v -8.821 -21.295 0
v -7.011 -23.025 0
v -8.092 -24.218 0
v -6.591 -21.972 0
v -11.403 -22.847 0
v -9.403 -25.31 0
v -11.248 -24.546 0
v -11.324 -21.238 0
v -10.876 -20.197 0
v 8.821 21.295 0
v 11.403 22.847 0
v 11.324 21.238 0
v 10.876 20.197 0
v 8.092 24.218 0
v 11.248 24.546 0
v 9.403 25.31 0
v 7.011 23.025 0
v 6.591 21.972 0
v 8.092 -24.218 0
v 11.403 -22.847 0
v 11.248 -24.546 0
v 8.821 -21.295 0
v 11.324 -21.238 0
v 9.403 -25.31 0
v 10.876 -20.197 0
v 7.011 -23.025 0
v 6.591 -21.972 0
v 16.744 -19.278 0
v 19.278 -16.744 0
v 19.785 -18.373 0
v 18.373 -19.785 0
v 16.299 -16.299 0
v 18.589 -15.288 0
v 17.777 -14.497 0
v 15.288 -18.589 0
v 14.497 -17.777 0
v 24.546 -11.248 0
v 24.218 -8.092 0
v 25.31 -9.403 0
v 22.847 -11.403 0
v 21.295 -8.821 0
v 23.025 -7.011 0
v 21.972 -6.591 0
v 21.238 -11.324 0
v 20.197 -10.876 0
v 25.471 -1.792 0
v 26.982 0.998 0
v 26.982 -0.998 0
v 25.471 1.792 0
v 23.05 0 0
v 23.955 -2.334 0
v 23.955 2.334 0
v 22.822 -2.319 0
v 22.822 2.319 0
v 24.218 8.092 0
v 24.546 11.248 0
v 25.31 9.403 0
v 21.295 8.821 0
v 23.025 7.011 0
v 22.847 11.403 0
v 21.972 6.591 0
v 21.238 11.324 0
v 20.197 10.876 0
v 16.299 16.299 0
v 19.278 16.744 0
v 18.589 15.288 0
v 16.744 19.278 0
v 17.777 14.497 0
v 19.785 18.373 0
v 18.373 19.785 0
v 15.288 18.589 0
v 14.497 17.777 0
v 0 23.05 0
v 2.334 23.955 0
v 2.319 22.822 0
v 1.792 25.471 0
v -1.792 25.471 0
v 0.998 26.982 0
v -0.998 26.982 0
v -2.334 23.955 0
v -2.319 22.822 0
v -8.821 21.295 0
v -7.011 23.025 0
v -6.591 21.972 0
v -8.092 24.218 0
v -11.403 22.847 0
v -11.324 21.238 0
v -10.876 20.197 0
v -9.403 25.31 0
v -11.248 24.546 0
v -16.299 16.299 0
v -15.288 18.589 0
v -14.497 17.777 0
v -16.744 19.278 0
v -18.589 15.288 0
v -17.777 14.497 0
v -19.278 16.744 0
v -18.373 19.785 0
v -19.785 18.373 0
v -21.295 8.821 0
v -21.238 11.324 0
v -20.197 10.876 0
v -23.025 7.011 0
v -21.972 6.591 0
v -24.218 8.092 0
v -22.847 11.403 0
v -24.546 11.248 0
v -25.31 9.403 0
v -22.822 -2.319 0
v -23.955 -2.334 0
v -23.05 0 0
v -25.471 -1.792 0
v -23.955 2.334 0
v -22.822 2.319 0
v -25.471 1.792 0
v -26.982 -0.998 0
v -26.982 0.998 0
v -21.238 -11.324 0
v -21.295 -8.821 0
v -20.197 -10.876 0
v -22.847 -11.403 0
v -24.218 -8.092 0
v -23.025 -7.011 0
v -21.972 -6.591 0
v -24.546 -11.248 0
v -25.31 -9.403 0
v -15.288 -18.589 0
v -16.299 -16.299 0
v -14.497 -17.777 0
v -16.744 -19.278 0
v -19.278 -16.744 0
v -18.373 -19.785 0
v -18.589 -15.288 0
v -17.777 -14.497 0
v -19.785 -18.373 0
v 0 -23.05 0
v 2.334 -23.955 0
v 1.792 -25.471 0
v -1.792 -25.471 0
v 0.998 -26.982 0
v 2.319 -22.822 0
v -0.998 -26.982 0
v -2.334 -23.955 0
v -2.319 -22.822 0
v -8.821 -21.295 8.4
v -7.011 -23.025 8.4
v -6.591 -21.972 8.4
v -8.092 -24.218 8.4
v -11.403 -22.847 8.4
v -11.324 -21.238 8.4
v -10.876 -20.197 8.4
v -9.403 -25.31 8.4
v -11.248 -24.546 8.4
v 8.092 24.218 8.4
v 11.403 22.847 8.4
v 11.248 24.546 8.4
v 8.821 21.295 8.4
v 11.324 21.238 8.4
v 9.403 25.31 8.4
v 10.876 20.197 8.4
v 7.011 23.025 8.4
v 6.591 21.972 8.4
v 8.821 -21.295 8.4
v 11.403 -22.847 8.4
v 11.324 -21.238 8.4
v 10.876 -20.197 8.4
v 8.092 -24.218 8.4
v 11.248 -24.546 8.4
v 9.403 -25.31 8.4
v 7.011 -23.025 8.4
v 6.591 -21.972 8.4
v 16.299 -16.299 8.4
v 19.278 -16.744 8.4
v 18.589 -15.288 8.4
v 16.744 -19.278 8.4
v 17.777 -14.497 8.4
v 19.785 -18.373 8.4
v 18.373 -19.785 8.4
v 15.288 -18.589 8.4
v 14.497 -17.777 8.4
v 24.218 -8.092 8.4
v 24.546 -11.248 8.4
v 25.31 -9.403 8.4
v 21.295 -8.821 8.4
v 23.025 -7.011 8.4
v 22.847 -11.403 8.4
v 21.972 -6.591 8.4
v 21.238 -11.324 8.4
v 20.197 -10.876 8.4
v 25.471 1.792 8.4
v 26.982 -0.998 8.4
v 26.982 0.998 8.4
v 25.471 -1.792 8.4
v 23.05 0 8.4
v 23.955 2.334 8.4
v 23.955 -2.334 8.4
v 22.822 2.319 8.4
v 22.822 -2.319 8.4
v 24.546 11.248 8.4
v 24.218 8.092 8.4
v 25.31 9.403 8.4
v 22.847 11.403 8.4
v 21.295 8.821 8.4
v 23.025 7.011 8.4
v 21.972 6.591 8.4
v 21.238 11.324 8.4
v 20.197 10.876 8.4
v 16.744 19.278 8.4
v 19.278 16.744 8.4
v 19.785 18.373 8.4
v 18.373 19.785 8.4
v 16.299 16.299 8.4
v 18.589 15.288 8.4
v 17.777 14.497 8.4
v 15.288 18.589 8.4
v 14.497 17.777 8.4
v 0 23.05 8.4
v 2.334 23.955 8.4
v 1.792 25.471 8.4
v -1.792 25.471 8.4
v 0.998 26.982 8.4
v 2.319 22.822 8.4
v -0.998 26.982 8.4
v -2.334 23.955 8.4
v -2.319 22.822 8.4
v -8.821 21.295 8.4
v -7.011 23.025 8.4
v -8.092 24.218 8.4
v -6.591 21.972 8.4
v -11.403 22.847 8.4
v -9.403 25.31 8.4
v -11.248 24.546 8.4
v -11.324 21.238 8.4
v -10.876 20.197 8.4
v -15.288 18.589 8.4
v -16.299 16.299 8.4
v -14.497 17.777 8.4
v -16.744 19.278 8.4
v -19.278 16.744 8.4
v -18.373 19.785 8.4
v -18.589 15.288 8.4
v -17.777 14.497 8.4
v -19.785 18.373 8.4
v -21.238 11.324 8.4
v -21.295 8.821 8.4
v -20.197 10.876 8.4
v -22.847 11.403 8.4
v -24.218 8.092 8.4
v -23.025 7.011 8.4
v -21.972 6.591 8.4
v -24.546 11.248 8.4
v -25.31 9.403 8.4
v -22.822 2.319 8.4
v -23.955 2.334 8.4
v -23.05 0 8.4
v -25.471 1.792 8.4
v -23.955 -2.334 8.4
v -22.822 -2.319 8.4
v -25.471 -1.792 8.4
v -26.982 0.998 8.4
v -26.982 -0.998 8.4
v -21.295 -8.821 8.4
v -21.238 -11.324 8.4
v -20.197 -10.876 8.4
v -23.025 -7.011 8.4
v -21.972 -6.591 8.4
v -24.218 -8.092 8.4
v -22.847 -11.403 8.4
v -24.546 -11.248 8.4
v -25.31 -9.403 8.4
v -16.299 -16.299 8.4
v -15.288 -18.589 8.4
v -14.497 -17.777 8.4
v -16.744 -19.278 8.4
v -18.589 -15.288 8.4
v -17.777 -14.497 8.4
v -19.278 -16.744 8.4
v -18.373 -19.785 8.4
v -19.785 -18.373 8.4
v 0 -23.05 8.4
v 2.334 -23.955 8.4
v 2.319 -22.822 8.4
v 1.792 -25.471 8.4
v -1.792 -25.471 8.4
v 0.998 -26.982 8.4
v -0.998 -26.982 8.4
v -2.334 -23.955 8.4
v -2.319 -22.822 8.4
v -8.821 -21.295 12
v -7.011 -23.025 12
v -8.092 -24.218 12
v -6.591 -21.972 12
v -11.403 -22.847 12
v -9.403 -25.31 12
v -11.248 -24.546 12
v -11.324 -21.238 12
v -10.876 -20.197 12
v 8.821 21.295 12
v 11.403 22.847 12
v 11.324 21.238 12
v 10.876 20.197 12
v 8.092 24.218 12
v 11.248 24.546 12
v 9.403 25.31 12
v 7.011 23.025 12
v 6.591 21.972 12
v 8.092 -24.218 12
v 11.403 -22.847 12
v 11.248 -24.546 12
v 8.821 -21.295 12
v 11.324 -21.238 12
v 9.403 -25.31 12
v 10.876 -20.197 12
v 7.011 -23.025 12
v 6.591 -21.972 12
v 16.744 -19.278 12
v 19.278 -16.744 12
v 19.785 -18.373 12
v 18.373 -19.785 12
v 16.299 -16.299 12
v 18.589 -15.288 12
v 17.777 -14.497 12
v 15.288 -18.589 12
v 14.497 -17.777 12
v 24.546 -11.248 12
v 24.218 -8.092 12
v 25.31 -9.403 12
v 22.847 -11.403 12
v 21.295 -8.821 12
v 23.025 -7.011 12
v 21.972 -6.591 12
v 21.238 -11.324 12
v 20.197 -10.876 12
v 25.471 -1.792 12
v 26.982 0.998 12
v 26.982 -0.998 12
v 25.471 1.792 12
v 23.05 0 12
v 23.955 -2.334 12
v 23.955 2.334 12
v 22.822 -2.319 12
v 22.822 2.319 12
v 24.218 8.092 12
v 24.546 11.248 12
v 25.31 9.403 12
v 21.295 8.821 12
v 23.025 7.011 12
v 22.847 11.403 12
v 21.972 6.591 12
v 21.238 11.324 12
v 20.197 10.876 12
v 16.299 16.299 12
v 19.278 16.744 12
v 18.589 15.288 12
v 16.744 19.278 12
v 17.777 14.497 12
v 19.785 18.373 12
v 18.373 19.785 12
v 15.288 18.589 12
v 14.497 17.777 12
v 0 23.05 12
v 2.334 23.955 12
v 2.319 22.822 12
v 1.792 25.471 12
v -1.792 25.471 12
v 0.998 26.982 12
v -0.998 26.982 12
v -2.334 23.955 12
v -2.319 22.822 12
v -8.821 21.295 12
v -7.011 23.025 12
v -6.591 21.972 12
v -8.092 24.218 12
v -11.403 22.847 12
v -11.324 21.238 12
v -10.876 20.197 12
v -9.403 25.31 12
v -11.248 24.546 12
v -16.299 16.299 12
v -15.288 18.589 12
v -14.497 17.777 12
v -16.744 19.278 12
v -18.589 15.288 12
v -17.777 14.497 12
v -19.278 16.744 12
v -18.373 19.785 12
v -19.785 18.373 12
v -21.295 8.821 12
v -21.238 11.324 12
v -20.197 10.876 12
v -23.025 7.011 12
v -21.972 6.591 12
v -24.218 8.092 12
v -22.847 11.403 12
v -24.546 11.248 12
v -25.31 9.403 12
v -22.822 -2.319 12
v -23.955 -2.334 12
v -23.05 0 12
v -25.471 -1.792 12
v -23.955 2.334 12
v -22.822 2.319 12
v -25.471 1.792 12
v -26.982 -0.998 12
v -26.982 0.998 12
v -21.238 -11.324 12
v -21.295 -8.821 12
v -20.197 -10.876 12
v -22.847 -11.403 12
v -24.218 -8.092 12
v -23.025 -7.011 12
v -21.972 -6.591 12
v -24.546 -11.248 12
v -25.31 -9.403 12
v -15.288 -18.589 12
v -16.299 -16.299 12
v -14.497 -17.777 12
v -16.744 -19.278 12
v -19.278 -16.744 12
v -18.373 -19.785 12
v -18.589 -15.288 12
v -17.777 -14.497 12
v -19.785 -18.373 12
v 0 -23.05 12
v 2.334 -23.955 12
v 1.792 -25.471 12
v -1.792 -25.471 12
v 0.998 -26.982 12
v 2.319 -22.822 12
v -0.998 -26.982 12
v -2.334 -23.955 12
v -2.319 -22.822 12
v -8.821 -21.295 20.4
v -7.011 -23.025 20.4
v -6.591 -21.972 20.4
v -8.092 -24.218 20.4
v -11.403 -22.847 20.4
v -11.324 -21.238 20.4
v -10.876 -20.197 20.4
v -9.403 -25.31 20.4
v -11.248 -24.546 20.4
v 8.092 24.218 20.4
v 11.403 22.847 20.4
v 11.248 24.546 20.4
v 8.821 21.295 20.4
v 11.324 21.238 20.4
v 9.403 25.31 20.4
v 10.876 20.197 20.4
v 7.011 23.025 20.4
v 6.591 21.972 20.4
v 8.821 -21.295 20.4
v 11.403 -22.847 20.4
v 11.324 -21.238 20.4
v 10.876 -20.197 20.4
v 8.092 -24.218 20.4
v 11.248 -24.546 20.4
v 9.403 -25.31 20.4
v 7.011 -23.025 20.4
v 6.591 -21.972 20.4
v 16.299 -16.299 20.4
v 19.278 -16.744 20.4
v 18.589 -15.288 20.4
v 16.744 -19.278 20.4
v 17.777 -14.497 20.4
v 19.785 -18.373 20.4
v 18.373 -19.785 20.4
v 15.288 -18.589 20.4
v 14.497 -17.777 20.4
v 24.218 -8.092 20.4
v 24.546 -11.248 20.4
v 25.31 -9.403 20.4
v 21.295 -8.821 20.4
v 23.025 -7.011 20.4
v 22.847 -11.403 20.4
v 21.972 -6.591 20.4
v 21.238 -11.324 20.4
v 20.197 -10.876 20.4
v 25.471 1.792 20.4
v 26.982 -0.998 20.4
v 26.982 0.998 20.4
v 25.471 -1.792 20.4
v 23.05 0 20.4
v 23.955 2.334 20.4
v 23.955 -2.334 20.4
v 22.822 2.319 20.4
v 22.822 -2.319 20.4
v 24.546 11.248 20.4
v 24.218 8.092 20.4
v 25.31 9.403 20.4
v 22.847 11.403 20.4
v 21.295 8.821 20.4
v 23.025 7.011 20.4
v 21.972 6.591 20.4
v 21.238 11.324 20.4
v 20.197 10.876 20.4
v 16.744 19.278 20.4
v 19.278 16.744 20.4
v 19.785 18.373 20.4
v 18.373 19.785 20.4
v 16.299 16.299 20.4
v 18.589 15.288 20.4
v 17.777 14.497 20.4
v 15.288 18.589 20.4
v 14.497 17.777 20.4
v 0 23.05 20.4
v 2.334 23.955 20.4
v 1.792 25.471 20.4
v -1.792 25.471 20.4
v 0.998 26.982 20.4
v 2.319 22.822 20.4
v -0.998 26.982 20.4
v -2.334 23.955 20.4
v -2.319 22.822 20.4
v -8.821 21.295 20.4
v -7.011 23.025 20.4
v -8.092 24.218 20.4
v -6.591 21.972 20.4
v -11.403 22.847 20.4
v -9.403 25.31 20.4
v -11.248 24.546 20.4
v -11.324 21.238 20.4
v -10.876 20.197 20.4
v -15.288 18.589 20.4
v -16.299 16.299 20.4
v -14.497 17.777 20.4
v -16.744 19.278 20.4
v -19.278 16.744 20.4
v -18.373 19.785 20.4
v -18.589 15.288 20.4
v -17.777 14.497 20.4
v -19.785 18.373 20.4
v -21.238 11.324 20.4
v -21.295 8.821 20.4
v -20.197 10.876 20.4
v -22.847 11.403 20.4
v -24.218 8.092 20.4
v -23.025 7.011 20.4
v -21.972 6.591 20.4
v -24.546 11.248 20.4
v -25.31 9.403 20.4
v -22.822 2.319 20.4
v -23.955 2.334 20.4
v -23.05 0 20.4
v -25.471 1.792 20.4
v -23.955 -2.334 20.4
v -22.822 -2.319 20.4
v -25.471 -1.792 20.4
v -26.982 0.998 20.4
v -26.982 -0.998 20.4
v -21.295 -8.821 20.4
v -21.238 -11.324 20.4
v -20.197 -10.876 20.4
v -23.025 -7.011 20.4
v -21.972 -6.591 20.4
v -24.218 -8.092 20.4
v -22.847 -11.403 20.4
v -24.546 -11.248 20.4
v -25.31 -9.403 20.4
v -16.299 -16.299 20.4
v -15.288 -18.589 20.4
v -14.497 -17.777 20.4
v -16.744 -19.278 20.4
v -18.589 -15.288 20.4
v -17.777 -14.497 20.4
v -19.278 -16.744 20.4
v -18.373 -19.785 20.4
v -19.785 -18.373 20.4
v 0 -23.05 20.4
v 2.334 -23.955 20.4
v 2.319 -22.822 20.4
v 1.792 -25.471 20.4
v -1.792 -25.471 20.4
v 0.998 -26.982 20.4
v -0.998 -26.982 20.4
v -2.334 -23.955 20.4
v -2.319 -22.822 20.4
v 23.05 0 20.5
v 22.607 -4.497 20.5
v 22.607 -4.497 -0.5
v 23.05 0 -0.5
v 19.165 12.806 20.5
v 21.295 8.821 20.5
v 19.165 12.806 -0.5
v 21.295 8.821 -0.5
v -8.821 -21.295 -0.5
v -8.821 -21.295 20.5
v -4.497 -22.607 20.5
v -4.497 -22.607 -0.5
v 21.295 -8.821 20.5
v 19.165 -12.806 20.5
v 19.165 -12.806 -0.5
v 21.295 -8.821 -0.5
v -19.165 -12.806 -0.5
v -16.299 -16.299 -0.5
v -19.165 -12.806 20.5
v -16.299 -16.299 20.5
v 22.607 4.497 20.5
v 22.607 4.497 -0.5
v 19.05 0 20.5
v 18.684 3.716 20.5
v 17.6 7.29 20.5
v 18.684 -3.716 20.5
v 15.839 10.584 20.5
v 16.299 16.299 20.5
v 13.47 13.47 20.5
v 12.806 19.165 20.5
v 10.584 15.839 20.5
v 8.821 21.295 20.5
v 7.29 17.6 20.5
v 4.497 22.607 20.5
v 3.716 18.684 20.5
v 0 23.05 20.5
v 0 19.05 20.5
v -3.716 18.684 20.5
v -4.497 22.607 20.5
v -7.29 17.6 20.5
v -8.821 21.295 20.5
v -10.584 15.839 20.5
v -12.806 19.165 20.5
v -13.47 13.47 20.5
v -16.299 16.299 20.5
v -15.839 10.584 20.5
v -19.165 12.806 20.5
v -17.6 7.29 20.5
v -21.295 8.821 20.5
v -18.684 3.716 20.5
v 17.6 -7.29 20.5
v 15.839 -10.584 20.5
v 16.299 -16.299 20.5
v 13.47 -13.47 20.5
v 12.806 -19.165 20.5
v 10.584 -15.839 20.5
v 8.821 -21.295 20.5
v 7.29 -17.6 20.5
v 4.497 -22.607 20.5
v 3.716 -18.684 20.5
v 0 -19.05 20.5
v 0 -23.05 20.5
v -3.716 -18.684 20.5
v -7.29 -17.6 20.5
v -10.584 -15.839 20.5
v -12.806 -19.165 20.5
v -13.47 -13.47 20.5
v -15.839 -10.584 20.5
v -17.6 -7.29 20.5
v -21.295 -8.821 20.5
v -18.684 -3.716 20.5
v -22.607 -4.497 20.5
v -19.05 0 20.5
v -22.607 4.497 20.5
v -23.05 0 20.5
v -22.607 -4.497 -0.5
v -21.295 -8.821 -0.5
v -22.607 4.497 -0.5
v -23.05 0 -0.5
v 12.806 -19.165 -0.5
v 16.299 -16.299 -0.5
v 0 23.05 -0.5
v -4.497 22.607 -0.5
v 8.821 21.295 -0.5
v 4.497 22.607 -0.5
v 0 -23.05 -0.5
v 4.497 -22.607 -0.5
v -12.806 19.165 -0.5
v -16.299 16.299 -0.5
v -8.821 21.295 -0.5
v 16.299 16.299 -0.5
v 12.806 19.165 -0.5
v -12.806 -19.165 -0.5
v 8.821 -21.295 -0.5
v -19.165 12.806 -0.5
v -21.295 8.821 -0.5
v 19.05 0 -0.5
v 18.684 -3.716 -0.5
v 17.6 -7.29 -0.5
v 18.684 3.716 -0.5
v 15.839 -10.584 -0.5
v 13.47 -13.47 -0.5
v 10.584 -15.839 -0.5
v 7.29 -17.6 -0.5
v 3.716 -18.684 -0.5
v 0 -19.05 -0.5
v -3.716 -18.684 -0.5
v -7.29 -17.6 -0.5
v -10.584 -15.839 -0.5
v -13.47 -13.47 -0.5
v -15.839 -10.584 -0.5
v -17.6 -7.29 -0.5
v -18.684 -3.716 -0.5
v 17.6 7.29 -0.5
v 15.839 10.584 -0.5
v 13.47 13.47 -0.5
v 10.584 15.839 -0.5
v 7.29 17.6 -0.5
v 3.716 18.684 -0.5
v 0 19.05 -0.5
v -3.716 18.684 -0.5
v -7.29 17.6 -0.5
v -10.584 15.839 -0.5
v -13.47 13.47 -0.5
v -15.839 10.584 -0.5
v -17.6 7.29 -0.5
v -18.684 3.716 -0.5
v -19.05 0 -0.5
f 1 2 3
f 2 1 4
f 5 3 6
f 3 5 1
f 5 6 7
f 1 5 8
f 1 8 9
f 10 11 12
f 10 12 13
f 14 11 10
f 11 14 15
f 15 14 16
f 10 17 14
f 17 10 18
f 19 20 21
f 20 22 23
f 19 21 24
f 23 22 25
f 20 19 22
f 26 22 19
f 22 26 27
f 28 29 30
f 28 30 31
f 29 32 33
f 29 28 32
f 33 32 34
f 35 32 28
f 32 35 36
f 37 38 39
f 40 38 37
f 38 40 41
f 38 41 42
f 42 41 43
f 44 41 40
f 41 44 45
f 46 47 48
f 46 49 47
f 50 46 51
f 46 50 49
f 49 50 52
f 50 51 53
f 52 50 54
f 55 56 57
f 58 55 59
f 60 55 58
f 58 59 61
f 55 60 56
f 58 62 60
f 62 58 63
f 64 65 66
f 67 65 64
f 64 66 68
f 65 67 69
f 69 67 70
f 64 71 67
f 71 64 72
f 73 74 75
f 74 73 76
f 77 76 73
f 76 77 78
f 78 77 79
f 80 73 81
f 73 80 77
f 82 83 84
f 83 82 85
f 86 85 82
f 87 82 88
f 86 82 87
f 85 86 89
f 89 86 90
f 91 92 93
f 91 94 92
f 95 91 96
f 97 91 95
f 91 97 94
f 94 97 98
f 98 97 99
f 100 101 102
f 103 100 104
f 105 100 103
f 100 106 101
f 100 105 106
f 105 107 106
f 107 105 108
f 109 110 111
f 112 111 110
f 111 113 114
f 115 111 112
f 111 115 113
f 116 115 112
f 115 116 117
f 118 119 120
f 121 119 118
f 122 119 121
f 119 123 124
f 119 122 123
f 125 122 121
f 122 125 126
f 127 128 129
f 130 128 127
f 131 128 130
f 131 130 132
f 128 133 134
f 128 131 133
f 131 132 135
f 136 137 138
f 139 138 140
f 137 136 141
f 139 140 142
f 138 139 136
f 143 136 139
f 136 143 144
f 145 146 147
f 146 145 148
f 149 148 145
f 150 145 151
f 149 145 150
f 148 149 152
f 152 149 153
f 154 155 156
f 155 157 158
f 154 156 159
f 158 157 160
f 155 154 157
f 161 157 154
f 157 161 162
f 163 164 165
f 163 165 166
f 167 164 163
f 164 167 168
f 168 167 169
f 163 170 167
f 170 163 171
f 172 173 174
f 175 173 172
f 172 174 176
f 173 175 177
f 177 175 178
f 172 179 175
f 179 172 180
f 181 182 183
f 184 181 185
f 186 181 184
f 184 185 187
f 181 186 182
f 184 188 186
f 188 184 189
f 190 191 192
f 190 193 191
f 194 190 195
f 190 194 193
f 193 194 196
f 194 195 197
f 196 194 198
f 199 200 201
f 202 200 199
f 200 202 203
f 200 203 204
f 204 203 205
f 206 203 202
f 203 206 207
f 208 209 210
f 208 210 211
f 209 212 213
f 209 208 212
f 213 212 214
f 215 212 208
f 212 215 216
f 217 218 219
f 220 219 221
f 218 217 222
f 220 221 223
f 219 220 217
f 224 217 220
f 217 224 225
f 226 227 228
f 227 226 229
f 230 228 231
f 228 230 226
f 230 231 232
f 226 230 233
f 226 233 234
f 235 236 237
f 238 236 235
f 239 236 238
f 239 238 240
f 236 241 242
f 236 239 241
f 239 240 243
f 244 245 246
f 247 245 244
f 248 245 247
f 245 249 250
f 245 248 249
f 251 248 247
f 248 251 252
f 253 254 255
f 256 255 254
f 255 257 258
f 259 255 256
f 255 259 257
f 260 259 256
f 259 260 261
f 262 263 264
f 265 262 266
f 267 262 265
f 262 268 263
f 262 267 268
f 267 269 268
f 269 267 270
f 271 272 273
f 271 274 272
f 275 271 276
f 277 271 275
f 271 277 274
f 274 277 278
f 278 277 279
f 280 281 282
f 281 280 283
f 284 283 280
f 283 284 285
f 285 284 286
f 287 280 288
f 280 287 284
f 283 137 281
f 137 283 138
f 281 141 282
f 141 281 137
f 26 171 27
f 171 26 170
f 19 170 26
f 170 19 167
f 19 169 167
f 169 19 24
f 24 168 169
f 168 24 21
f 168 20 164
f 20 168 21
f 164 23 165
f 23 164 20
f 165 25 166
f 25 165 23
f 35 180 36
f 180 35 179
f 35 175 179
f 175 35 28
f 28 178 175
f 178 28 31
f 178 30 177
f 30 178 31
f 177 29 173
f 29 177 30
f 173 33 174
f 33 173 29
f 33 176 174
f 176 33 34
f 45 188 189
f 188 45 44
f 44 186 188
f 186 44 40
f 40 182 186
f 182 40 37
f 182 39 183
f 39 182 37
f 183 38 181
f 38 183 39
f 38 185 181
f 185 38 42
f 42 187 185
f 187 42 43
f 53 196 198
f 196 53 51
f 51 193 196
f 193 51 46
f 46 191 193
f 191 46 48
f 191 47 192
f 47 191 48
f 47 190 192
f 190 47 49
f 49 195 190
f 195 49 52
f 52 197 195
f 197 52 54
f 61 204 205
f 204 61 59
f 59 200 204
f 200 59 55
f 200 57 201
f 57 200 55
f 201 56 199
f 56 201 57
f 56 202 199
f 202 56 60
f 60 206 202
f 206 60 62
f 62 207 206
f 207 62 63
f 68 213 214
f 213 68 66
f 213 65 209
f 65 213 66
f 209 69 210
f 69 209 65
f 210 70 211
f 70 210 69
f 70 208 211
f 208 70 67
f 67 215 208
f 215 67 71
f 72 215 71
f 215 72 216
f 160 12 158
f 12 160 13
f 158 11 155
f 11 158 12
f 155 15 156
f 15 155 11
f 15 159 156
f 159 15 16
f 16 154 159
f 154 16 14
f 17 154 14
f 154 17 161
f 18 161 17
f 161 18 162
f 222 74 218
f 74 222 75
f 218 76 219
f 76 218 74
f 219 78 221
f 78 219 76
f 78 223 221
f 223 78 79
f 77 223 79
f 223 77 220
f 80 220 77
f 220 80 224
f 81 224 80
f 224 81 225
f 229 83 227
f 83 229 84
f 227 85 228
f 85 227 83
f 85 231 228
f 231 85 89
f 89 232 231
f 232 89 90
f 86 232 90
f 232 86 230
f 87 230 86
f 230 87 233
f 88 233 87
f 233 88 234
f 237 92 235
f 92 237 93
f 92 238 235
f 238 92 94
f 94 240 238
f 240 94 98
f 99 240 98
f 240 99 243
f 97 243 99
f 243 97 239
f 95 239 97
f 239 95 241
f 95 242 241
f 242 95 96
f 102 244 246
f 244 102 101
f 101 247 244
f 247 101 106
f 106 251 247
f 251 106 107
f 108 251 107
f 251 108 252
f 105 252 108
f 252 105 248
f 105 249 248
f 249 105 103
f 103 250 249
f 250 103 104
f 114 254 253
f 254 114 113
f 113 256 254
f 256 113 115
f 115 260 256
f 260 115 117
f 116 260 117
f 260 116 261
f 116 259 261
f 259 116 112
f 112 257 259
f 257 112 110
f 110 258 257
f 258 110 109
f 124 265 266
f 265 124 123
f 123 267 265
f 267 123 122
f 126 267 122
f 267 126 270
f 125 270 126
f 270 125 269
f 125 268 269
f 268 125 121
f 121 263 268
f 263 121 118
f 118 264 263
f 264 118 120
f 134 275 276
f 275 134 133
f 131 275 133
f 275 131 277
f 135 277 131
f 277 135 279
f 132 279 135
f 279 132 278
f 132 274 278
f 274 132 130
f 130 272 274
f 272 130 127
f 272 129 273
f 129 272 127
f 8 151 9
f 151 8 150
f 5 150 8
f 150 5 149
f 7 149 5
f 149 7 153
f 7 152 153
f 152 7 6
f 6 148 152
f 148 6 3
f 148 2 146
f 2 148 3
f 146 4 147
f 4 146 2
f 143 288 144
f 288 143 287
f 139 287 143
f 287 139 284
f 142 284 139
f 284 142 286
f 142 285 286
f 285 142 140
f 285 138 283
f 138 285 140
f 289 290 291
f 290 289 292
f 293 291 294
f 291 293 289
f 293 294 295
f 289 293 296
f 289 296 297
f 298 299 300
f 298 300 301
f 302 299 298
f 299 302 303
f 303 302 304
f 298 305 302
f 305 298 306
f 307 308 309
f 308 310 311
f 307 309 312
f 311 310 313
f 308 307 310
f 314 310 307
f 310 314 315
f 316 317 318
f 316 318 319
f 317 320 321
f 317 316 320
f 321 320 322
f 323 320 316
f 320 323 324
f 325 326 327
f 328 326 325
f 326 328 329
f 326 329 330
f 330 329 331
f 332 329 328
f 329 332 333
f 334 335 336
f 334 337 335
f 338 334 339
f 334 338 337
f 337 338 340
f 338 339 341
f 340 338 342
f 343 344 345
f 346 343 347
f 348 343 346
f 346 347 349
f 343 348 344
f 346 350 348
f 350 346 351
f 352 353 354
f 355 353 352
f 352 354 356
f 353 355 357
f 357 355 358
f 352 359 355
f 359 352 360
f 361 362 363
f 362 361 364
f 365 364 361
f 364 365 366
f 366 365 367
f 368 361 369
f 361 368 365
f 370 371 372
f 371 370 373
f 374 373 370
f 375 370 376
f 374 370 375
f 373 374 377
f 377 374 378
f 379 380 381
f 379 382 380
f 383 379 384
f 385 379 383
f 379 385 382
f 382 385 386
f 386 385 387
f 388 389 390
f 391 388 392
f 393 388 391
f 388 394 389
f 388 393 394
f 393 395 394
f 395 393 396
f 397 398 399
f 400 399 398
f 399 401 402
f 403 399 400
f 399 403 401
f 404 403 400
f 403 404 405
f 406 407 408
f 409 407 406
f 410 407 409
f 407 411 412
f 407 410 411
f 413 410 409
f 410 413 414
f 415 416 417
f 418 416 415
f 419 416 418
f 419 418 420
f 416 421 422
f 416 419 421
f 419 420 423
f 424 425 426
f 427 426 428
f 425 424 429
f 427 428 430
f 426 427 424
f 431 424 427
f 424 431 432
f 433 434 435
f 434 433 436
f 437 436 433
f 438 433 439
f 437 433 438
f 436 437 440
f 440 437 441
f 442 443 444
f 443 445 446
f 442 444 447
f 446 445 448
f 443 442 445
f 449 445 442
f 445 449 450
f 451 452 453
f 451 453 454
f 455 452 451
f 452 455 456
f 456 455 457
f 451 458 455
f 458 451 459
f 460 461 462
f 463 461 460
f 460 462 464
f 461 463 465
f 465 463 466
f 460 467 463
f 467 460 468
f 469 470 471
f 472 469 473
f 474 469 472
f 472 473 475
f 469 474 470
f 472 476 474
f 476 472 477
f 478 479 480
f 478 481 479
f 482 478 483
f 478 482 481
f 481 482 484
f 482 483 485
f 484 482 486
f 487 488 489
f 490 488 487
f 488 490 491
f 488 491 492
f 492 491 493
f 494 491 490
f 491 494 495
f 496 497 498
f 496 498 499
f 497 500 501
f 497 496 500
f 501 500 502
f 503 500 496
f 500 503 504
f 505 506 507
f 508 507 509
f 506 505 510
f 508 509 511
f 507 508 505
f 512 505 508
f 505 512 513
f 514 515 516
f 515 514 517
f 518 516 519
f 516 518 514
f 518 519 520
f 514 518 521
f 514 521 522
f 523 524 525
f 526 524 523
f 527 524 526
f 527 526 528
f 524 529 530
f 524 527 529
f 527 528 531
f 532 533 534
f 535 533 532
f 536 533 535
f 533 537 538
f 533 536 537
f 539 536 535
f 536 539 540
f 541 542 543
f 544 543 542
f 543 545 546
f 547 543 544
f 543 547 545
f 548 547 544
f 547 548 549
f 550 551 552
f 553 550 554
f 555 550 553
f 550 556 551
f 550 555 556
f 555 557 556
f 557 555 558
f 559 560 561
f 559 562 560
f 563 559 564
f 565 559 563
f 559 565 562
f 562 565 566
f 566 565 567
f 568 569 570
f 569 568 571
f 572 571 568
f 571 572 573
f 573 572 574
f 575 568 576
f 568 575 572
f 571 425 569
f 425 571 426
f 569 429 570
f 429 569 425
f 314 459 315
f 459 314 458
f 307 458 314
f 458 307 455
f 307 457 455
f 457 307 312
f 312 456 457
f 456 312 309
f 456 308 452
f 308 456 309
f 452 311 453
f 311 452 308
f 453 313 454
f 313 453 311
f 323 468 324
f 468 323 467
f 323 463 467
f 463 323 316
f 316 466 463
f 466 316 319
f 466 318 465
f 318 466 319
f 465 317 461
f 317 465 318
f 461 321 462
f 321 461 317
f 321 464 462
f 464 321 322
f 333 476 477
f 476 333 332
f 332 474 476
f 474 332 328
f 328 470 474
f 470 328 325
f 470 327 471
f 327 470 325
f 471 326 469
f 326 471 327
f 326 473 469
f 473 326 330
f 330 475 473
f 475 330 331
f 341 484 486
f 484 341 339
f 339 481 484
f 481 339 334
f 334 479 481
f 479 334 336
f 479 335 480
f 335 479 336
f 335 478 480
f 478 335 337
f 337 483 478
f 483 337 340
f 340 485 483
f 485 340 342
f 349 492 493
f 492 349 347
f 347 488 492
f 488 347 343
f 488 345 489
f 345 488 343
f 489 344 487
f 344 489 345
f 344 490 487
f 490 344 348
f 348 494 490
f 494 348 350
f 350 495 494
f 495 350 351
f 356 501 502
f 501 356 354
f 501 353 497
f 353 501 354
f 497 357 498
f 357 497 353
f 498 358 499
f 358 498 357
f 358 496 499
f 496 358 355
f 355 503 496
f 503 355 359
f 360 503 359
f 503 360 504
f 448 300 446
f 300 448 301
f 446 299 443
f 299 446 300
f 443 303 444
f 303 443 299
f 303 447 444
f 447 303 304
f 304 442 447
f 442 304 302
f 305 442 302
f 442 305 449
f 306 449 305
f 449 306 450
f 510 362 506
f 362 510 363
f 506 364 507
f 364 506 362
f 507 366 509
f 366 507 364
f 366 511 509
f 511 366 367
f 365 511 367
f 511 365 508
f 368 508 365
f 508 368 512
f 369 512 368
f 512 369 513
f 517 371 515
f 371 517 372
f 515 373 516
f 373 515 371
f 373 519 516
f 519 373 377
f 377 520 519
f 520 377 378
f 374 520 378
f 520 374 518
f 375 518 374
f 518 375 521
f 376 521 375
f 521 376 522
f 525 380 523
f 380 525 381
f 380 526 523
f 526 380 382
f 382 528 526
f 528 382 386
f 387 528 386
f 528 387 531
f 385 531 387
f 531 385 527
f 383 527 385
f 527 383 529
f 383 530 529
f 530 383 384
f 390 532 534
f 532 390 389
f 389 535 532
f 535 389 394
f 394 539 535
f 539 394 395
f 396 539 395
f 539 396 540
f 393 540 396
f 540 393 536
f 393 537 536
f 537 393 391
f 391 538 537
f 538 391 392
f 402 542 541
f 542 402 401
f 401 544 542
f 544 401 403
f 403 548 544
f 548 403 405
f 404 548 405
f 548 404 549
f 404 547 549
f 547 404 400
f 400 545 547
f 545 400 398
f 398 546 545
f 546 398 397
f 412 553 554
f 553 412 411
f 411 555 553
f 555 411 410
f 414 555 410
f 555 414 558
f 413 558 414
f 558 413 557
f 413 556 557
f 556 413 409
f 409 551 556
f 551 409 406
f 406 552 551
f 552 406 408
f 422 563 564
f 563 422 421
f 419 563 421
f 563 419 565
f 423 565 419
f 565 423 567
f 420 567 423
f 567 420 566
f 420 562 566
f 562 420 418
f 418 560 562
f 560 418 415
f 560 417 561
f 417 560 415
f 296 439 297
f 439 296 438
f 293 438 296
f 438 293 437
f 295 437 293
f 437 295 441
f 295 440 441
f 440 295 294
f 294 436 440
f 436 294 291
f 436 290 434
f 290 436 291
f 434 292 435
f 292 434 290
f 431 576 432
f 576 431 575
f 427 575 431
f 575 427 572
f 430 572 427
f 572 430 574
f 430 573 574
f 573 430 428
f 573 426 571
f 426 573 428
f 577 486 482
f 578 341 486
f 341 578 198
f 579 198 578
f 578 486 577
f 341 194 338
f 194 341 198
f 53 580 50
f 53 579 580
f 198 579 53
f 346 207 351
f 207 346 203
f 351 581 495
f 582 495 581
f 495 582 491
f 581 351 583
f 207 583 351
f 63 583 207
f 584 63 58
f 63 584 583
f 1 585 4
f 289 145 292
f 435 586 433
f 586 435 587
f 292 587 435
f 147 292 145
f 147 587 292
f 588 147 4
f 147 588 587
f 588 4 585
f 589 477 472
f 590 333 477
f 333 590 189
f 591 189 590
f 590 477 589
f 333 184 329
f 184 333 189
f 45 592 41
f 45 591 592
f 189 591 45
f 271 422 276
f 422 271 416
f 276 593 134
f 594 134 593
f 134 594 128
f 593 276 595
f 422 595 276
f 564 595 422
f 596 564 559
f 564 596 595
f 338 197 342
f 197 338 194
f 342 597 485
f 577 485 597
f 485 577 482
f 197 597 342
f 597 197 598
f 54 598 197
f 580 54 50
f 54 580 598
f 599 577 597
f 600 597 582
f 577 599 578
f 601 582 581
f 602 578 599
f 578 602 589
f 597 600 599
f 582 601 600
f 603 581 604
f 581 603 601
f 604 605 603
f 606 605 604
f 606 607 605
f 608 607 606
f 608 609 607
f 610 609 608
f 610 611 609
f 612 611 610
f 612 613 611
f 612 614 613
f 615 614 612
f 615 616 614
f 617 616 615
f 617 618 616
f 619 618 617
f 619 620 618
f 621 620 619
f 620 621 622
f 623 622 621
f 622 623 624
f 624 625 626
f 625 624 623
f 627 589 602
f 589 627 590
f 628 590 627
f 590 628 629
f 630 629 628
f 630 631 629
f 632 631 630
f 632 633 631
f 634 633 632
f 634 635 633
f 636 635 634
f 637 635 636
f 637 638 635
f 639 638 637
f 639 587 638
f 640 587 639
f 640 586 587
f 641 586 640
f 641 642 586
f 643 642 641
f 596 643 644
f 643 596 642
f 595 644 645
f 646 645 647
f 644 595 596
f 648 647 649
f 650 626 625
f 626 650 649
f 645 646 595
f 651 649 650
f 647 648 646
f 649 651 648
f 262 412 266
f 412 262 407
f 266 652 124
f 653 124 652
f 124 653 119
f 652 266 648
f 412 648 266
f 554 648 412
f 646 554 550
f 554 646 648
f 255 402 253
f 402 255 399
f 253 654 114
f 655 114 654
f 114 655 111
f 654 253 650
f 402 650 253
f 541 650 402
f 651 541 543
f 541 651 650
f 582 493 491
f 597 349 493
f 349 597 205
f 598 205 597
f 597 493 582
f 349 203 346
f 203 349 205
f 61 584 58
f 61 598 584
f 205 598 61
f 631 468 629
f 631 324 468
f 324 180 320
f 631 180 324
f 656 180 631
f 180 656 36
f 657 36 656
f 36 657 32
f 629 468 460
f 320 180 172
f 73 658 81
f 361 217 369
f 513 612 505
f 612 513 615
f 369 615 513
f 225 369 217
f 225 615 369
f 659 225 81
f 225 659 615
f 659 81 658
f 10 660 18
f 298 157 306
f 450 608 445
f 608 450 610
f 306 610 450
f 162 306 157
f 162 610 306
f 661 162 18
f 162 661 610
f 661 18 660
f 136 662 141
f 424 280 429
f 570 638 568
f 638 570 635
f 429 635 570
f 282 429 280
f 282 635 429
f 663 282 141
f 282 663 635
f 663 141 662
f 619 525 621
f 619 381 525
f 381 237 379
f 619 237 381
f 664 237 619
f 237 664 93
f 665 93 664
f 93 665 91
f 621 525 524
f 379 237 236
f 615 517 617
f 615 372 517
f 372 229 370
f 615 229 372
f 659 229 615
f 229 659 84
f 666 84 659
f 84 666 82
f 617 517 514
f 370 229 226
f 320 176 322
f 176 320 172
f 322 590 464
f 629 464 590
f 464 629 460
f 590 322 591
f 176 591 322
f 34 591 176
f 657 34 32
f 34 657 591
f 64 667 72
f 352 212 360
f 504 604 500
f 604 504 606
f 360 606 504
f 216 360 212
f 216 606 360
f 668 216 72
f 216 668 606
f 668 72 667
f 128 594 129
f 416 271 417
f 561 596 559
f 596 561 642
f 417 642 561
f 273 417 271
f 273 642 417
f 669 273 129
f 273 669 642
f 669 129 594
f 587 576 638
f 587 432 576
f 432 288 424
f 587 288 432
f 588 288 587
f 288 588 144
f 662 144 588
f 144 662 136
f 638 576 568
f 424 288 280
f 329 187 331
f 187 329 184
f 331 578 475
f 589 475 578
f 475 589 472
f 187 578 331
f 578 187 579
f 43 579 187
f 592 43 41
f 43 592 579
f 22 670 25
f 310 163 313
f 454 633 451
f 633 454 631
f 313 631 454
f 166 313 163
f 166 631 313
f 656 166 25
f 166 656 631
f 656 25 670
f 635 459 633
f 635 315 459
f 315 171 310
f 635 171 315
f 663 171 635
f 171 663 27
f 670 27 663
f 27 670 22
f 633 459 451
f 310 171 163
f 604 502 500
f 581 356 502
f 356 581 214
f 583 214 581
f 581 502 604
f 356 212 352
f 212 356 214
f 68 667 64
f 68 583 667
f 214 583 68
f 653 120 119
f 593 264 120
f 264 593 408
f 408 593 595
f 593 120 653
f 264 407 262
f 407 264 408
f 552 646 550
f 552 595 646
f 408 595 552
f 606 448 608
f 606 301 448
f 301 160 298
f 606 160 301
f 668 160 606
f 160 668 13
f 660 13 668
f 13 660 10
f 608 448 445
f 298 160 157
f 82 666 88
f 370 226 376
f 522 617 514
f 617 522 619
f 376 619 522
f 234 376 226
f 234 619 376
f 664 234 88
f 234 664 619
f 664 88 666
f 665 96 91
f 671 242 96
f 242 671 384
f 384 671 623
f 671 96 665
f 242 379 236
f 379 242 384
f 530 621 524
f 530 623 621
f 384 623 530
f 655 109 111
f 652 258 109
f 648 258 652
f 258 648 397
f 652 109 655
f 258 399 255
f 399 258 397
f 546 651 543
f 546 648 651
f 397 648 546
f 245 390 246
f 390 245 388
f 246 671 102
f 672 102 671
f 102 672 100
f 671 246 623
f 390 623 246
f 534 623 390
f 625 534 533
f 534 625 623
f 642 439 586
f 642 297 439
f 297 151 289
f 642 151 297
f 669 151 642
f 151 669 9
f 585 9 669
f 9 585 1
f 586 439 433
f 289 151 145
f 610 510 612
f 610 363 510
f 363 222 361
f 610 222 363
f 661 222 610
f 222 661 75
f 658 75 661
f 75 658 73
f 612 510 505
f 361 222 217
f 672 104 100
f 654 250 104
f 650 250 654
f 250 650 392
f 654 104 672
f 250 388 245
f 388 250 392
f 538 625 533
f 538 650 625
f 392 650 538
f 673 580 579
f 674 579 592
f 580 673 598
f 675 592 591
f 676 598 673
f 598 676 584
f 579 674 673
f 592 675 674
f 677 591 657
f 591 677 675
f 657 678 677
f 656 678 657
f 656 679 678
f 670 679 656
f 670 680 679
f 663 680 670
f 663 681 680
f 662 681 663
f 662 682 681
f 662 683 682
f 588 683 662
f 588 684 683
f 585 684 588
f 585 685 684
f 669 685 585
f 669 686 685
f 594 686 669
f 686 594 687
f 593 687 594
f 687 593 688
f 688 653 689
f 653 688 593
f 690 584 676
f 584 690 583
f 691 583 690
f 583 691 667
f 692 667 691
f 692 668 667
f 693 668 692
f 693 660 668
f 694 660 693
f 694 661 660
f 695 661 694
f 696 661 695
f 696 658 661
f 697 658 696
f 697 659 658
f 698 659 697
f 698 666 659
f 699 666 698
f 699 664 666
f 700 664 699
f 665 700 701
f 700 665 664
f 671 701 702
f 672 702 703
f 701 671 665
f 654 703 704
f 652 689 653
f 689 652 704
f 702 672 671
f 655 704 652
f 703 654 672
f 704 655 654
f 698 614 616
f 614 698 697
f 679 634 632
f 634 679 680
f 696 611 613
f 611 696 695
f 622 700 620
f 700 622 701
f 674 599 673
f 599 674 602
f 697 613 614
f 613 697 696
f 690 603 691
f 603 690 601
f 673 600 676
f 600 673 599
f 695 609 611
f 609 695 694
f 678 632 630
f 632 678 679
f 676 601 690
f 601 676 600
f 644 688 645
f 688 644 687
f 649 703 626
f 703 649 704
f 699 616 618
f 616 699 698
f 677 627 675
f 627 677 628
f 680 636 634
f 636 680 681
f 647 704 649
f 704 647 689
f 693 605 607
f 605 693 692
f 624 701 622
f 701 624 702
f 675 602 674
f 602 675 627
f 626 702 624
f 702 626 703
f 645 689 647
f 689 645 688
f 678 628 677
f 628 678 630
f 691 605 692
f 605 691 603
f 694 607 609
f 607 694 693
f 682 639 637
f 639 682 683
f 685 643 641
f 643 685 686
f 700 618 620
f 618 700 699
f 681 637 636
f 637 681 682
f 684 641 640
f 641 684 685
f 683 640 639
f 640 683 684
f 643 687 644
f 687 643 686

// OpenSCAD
$fn = 32;

// ----------------------------------------------------------------------
// Two-module gear rim: z16 m3 and z16 m3, 20 mm wide
// ----------------------------------------------------------------------

// --- parameters (mm) ---
module_a = 3;             // first tooth module
teeth_a = 16;             // first band tooth count
module_b = 3;             // second tooth module
teeth_b = 16;             // second band tooth count
band_h = 8;               // height of one tooth band
web_t = 4;                // web thickness between the bands
total = 20;               // overall width over both bands
root_r = 20.25;           // root radius of the coarse band
hub_r = 23.05;            // hub radius
bore_d = 38.1;            // hub bore
hole_count = 4;           // lightening holes
hole_r = 14.98;           // lightening hole circle radius
hole_d = 4.74;            // lightening hole diameter

band_a = [[20.121, -2.283], [23.955, -2.334], [25.471, -1.792], [26.982, -0.998], [26.982, 0.998], [25.471, 1.792], [23.955, 2.334], [20.121, 2.283], [19.463, 5.591], [23.025, 7.011], [24.218, 8.092], [25.31, 9.403], [24.546, 11.248], [22.847, 11.403], [21.238, 11.324], [17.716, 9.809], [15.842, 12.613], [18.589, 15.288], [19.278, 16.744], [19.785, 18.373], [18.373, 19.785], [16.744, 19.278], [15.288, 18.589], [12.613, 15.842], [9.809, 17.716], [11.324, 21.238], [11.403, 22.847], [11.248, 24.546], [9.403, 25.31], [8.092, 24.218], [7.011, 23.025], [5.591, 19.463], [2.283, 20.121], [2.334, 23.955], [1.792, 25.471], [0.998, 26.982], [-0.998, 26.982], [-1.792, 25.471], [-2.334, 23.955], [-2.283, 20.121], [-5.591, 19.463], [-7.011, 23.025], [-8.092, 24.218], [-9.403, 25.31], [-11.248, 24.546], [-11.403, 22.847], [-11.324, 21.238], [-9.809, 17.716], [-12.613, 15.842], [-15.288, 18.589], [-16.744, 19.278], [-18.373, 19.785], [-19.785, 18.373], [-19.278, 16.744], [-18.589, 15.288], [-15.842, 12.613], [-17.716, 9.809], [-21.238, 11.324], [-22.847, 11.403], [-24.546, 11.248], [-25.31, 9.403], [-24.218, 8.092], [-23.025, 7.011], [-19.463, 5.591], [-20.121, 2.283], [-23.955, 2.334], [-25.471, 1.792], [-26.982, 0.998], [-26.982, -0.998], [-25.471, -1.792], [-23.955, -2.334], [-20.121, -2.283], [-19.463, -5.591], [-23.025, -7.011], [-24.218, -8.092], [-25.31, -9.403], [-24.546, -11.248], [-22.847, -11.403], [-21.238, -11.324], [-17.716, -9.809], [-15.842, -12.613], [-18.589, -15.288], [-19.278, -16.744], [-19.785, -18.373], [-18.373, -19.785], [-16.744, -19.278], [-15.288, -18.589], [-12.613, -15.842], [-9.809, -17.716], [-11.324, -21.238], [-11.403, -22.847], [-11.248, -24.546], [-9.403, -25.31], [-8.092, -24.218], [-7.011, -23.025], [-5.591, -19.463], [-2.283, -20.121], [-2.334, -23.955], [-1.792, -25.471], [-0.998, -26.982], [0.998, -26.982], [1.792, -25.471], [2.334, -23.955], [2.283, -20.121], [5.591, -19.463], [7.011, -23.025], [8.092, -24.218], [9.403, -25.31], [11.248, -24.546], [11.403, -22.847], [11.324, -21.238], [9.809, -17.716], [12.613, -15.842], [15.288, -18.589], [16.744, -19.278], [18.373, -19.785], [19.785, -18.373], [19.278, -16.744], [18.589, -15.288], [15.842, -12.613], [17.716, -9.809], [21.238, -11.324], [22.847, -11.403], [24.546, -11.248], [25.31, -9.403], [24.218, -8.092], [23.025, -7.011], [19.463, -5.591]];
band_b = [[20.121, -2.283], [23.955, -2.334], [25.471, -1.792], [26.982, -0.998], [26.982, 0.998], [25.471, 1.792], [23.955, 2.334], [20.121, 2.283], [19.463, 5.591], [23.025, 7.011], [24.218, 8.092], [25.31, 9.403], [24.546, 11.248], [22.847, 11.403], [21.238, 11.324], [17.716, 9.809], [15.842, 12.613], [18.589, 15.288], [19.278, 16.744], [19.785, 18.373], [18.373, 19.785], [16.744, 19.278], [15.288, 18.589], [12.613, 15.842], [9.809, 17.716], [11.324, 21.238], [11.403, 22.847], [11.248, 24.546], [9.403, 25.31], [8.092, 24.218], [7.011, 23.025], [5.591, 19.463], [2.283, 20.121], [2.334, 23.955], [1.792, 25.471], [0.998, 26.982], [-0.998, 26.982], [-1.792, 25.471], [-2.334, 23.955], [-2.283, 20.121], [-5.591, 19.463], [-7.011, 23.025], [-8.092, 24.218], [-9.403, 25.31], [-11.248, 24.546], [-11.403, 22.847], [-11.324, 21.238], [-9.809, 17.716], [-12.613, 15.842], [-15.288, 18.589], [-16.744, 19.278], [-18.373, 19.785], [-19.785, 18.373], [-19.278, 16.744], [-18.589, 15.288], [-15.842, 12.613], [-17.716, 9.809], [-21.238, 11.324], [-22.847, 11.403], [-24.546, 11.248], [-25.31, 9.403], [-24.218, 8.092], [-23.025, 7.011], [-19.463, 5.591], [-20.121, 2.283], [-23.955, 2.334], [-25.471, 1.792], [-26.982, 0.998], [-26.982, -0.998], [-25.471, -1.792], [-23.955, -2.334], [-20.121, -2.283], [-19.463, -5.591], [-23.025, -7.011], [-24.218, -8.092], [-25.31, -9.403], [-24.546, -11.248], [-22.847, -11.403], [-21.238, -11.324], [-17.716, -9.809], [-15.842, -12.613], [-18.589, -15.288], [-19.278, -16.744], [-19.785, -18.373], [-18.373, -19.785], [-16.744, -19.278], [-15.288, -18.589], [-12.613, -15.842], [-9.809, -17.716], [-11.324, -21.238], [-11.403, -22.847], [-11.248, -24.546], [-9.403, -25.31], [-8.092, -24.218], [-7.011, -23.025], [-5.591, -19.463], [-2.283, -20.121], [-2.334, -23.955], [-1.792, -25.471], [-0.998, -26.982], [0.998, -26.982], [1.792, -25.471], [2.334, -23.955], [2.283, -20.121], [5.591, -19.463], [7.011, -23.025], [8.092, -24.218], [9.403, -25.31], [11.248, -24.546], [11.403, -22.847], [11.324, -21.238], [9.809, -17.716], [12.613, -15.842], [15.288, -18.589], [16.744, -19.278], [18.373, -19.785], [19.785, -18.373], [19.278, -16.744], [18.589, -15.288], [15.842, -12.613], [17.716, -9.809], [21.238, -11.324], [22.847, -11.403], [24.546, -11.248], [25.31, -9.403], [24.218, -8.092], [23.025, -7.011], [19.463, -5.591]];

difference() {
  union() {
    /* tooth band A, overlapping the web by 0.4 mm */
    linear_extrude(height = band_h + 0.4) polygon(band_a);
    /* web */
    translate([0, 0, band_h - 0.4]) cylinder(h = web_t + 0.8, d = 2 * root_r);
    /* tooth band B */
    translate([0, 0, band_h + web_t]) linear_extrude(height = band_h + 0.4) polygon(band_b);
    /* hub */
    translate([0, 0, -0.5]) cylinder(h = total + 1.0, d = 2 * hub_r);
  }
  /* bore */
  translate([0, 0, -2.5]) cylinder(h = total + 5, d = bore_d);
  /* lightening holes through the web */
  for (i = [0 : hole_count - 1]) {
    a = i * 360 / hole_count;
    translate([hole_r * cos(a), hole_r * sin(a), -2.5]) cylinder(h = total + 5, d = hole_d);
  }
}
